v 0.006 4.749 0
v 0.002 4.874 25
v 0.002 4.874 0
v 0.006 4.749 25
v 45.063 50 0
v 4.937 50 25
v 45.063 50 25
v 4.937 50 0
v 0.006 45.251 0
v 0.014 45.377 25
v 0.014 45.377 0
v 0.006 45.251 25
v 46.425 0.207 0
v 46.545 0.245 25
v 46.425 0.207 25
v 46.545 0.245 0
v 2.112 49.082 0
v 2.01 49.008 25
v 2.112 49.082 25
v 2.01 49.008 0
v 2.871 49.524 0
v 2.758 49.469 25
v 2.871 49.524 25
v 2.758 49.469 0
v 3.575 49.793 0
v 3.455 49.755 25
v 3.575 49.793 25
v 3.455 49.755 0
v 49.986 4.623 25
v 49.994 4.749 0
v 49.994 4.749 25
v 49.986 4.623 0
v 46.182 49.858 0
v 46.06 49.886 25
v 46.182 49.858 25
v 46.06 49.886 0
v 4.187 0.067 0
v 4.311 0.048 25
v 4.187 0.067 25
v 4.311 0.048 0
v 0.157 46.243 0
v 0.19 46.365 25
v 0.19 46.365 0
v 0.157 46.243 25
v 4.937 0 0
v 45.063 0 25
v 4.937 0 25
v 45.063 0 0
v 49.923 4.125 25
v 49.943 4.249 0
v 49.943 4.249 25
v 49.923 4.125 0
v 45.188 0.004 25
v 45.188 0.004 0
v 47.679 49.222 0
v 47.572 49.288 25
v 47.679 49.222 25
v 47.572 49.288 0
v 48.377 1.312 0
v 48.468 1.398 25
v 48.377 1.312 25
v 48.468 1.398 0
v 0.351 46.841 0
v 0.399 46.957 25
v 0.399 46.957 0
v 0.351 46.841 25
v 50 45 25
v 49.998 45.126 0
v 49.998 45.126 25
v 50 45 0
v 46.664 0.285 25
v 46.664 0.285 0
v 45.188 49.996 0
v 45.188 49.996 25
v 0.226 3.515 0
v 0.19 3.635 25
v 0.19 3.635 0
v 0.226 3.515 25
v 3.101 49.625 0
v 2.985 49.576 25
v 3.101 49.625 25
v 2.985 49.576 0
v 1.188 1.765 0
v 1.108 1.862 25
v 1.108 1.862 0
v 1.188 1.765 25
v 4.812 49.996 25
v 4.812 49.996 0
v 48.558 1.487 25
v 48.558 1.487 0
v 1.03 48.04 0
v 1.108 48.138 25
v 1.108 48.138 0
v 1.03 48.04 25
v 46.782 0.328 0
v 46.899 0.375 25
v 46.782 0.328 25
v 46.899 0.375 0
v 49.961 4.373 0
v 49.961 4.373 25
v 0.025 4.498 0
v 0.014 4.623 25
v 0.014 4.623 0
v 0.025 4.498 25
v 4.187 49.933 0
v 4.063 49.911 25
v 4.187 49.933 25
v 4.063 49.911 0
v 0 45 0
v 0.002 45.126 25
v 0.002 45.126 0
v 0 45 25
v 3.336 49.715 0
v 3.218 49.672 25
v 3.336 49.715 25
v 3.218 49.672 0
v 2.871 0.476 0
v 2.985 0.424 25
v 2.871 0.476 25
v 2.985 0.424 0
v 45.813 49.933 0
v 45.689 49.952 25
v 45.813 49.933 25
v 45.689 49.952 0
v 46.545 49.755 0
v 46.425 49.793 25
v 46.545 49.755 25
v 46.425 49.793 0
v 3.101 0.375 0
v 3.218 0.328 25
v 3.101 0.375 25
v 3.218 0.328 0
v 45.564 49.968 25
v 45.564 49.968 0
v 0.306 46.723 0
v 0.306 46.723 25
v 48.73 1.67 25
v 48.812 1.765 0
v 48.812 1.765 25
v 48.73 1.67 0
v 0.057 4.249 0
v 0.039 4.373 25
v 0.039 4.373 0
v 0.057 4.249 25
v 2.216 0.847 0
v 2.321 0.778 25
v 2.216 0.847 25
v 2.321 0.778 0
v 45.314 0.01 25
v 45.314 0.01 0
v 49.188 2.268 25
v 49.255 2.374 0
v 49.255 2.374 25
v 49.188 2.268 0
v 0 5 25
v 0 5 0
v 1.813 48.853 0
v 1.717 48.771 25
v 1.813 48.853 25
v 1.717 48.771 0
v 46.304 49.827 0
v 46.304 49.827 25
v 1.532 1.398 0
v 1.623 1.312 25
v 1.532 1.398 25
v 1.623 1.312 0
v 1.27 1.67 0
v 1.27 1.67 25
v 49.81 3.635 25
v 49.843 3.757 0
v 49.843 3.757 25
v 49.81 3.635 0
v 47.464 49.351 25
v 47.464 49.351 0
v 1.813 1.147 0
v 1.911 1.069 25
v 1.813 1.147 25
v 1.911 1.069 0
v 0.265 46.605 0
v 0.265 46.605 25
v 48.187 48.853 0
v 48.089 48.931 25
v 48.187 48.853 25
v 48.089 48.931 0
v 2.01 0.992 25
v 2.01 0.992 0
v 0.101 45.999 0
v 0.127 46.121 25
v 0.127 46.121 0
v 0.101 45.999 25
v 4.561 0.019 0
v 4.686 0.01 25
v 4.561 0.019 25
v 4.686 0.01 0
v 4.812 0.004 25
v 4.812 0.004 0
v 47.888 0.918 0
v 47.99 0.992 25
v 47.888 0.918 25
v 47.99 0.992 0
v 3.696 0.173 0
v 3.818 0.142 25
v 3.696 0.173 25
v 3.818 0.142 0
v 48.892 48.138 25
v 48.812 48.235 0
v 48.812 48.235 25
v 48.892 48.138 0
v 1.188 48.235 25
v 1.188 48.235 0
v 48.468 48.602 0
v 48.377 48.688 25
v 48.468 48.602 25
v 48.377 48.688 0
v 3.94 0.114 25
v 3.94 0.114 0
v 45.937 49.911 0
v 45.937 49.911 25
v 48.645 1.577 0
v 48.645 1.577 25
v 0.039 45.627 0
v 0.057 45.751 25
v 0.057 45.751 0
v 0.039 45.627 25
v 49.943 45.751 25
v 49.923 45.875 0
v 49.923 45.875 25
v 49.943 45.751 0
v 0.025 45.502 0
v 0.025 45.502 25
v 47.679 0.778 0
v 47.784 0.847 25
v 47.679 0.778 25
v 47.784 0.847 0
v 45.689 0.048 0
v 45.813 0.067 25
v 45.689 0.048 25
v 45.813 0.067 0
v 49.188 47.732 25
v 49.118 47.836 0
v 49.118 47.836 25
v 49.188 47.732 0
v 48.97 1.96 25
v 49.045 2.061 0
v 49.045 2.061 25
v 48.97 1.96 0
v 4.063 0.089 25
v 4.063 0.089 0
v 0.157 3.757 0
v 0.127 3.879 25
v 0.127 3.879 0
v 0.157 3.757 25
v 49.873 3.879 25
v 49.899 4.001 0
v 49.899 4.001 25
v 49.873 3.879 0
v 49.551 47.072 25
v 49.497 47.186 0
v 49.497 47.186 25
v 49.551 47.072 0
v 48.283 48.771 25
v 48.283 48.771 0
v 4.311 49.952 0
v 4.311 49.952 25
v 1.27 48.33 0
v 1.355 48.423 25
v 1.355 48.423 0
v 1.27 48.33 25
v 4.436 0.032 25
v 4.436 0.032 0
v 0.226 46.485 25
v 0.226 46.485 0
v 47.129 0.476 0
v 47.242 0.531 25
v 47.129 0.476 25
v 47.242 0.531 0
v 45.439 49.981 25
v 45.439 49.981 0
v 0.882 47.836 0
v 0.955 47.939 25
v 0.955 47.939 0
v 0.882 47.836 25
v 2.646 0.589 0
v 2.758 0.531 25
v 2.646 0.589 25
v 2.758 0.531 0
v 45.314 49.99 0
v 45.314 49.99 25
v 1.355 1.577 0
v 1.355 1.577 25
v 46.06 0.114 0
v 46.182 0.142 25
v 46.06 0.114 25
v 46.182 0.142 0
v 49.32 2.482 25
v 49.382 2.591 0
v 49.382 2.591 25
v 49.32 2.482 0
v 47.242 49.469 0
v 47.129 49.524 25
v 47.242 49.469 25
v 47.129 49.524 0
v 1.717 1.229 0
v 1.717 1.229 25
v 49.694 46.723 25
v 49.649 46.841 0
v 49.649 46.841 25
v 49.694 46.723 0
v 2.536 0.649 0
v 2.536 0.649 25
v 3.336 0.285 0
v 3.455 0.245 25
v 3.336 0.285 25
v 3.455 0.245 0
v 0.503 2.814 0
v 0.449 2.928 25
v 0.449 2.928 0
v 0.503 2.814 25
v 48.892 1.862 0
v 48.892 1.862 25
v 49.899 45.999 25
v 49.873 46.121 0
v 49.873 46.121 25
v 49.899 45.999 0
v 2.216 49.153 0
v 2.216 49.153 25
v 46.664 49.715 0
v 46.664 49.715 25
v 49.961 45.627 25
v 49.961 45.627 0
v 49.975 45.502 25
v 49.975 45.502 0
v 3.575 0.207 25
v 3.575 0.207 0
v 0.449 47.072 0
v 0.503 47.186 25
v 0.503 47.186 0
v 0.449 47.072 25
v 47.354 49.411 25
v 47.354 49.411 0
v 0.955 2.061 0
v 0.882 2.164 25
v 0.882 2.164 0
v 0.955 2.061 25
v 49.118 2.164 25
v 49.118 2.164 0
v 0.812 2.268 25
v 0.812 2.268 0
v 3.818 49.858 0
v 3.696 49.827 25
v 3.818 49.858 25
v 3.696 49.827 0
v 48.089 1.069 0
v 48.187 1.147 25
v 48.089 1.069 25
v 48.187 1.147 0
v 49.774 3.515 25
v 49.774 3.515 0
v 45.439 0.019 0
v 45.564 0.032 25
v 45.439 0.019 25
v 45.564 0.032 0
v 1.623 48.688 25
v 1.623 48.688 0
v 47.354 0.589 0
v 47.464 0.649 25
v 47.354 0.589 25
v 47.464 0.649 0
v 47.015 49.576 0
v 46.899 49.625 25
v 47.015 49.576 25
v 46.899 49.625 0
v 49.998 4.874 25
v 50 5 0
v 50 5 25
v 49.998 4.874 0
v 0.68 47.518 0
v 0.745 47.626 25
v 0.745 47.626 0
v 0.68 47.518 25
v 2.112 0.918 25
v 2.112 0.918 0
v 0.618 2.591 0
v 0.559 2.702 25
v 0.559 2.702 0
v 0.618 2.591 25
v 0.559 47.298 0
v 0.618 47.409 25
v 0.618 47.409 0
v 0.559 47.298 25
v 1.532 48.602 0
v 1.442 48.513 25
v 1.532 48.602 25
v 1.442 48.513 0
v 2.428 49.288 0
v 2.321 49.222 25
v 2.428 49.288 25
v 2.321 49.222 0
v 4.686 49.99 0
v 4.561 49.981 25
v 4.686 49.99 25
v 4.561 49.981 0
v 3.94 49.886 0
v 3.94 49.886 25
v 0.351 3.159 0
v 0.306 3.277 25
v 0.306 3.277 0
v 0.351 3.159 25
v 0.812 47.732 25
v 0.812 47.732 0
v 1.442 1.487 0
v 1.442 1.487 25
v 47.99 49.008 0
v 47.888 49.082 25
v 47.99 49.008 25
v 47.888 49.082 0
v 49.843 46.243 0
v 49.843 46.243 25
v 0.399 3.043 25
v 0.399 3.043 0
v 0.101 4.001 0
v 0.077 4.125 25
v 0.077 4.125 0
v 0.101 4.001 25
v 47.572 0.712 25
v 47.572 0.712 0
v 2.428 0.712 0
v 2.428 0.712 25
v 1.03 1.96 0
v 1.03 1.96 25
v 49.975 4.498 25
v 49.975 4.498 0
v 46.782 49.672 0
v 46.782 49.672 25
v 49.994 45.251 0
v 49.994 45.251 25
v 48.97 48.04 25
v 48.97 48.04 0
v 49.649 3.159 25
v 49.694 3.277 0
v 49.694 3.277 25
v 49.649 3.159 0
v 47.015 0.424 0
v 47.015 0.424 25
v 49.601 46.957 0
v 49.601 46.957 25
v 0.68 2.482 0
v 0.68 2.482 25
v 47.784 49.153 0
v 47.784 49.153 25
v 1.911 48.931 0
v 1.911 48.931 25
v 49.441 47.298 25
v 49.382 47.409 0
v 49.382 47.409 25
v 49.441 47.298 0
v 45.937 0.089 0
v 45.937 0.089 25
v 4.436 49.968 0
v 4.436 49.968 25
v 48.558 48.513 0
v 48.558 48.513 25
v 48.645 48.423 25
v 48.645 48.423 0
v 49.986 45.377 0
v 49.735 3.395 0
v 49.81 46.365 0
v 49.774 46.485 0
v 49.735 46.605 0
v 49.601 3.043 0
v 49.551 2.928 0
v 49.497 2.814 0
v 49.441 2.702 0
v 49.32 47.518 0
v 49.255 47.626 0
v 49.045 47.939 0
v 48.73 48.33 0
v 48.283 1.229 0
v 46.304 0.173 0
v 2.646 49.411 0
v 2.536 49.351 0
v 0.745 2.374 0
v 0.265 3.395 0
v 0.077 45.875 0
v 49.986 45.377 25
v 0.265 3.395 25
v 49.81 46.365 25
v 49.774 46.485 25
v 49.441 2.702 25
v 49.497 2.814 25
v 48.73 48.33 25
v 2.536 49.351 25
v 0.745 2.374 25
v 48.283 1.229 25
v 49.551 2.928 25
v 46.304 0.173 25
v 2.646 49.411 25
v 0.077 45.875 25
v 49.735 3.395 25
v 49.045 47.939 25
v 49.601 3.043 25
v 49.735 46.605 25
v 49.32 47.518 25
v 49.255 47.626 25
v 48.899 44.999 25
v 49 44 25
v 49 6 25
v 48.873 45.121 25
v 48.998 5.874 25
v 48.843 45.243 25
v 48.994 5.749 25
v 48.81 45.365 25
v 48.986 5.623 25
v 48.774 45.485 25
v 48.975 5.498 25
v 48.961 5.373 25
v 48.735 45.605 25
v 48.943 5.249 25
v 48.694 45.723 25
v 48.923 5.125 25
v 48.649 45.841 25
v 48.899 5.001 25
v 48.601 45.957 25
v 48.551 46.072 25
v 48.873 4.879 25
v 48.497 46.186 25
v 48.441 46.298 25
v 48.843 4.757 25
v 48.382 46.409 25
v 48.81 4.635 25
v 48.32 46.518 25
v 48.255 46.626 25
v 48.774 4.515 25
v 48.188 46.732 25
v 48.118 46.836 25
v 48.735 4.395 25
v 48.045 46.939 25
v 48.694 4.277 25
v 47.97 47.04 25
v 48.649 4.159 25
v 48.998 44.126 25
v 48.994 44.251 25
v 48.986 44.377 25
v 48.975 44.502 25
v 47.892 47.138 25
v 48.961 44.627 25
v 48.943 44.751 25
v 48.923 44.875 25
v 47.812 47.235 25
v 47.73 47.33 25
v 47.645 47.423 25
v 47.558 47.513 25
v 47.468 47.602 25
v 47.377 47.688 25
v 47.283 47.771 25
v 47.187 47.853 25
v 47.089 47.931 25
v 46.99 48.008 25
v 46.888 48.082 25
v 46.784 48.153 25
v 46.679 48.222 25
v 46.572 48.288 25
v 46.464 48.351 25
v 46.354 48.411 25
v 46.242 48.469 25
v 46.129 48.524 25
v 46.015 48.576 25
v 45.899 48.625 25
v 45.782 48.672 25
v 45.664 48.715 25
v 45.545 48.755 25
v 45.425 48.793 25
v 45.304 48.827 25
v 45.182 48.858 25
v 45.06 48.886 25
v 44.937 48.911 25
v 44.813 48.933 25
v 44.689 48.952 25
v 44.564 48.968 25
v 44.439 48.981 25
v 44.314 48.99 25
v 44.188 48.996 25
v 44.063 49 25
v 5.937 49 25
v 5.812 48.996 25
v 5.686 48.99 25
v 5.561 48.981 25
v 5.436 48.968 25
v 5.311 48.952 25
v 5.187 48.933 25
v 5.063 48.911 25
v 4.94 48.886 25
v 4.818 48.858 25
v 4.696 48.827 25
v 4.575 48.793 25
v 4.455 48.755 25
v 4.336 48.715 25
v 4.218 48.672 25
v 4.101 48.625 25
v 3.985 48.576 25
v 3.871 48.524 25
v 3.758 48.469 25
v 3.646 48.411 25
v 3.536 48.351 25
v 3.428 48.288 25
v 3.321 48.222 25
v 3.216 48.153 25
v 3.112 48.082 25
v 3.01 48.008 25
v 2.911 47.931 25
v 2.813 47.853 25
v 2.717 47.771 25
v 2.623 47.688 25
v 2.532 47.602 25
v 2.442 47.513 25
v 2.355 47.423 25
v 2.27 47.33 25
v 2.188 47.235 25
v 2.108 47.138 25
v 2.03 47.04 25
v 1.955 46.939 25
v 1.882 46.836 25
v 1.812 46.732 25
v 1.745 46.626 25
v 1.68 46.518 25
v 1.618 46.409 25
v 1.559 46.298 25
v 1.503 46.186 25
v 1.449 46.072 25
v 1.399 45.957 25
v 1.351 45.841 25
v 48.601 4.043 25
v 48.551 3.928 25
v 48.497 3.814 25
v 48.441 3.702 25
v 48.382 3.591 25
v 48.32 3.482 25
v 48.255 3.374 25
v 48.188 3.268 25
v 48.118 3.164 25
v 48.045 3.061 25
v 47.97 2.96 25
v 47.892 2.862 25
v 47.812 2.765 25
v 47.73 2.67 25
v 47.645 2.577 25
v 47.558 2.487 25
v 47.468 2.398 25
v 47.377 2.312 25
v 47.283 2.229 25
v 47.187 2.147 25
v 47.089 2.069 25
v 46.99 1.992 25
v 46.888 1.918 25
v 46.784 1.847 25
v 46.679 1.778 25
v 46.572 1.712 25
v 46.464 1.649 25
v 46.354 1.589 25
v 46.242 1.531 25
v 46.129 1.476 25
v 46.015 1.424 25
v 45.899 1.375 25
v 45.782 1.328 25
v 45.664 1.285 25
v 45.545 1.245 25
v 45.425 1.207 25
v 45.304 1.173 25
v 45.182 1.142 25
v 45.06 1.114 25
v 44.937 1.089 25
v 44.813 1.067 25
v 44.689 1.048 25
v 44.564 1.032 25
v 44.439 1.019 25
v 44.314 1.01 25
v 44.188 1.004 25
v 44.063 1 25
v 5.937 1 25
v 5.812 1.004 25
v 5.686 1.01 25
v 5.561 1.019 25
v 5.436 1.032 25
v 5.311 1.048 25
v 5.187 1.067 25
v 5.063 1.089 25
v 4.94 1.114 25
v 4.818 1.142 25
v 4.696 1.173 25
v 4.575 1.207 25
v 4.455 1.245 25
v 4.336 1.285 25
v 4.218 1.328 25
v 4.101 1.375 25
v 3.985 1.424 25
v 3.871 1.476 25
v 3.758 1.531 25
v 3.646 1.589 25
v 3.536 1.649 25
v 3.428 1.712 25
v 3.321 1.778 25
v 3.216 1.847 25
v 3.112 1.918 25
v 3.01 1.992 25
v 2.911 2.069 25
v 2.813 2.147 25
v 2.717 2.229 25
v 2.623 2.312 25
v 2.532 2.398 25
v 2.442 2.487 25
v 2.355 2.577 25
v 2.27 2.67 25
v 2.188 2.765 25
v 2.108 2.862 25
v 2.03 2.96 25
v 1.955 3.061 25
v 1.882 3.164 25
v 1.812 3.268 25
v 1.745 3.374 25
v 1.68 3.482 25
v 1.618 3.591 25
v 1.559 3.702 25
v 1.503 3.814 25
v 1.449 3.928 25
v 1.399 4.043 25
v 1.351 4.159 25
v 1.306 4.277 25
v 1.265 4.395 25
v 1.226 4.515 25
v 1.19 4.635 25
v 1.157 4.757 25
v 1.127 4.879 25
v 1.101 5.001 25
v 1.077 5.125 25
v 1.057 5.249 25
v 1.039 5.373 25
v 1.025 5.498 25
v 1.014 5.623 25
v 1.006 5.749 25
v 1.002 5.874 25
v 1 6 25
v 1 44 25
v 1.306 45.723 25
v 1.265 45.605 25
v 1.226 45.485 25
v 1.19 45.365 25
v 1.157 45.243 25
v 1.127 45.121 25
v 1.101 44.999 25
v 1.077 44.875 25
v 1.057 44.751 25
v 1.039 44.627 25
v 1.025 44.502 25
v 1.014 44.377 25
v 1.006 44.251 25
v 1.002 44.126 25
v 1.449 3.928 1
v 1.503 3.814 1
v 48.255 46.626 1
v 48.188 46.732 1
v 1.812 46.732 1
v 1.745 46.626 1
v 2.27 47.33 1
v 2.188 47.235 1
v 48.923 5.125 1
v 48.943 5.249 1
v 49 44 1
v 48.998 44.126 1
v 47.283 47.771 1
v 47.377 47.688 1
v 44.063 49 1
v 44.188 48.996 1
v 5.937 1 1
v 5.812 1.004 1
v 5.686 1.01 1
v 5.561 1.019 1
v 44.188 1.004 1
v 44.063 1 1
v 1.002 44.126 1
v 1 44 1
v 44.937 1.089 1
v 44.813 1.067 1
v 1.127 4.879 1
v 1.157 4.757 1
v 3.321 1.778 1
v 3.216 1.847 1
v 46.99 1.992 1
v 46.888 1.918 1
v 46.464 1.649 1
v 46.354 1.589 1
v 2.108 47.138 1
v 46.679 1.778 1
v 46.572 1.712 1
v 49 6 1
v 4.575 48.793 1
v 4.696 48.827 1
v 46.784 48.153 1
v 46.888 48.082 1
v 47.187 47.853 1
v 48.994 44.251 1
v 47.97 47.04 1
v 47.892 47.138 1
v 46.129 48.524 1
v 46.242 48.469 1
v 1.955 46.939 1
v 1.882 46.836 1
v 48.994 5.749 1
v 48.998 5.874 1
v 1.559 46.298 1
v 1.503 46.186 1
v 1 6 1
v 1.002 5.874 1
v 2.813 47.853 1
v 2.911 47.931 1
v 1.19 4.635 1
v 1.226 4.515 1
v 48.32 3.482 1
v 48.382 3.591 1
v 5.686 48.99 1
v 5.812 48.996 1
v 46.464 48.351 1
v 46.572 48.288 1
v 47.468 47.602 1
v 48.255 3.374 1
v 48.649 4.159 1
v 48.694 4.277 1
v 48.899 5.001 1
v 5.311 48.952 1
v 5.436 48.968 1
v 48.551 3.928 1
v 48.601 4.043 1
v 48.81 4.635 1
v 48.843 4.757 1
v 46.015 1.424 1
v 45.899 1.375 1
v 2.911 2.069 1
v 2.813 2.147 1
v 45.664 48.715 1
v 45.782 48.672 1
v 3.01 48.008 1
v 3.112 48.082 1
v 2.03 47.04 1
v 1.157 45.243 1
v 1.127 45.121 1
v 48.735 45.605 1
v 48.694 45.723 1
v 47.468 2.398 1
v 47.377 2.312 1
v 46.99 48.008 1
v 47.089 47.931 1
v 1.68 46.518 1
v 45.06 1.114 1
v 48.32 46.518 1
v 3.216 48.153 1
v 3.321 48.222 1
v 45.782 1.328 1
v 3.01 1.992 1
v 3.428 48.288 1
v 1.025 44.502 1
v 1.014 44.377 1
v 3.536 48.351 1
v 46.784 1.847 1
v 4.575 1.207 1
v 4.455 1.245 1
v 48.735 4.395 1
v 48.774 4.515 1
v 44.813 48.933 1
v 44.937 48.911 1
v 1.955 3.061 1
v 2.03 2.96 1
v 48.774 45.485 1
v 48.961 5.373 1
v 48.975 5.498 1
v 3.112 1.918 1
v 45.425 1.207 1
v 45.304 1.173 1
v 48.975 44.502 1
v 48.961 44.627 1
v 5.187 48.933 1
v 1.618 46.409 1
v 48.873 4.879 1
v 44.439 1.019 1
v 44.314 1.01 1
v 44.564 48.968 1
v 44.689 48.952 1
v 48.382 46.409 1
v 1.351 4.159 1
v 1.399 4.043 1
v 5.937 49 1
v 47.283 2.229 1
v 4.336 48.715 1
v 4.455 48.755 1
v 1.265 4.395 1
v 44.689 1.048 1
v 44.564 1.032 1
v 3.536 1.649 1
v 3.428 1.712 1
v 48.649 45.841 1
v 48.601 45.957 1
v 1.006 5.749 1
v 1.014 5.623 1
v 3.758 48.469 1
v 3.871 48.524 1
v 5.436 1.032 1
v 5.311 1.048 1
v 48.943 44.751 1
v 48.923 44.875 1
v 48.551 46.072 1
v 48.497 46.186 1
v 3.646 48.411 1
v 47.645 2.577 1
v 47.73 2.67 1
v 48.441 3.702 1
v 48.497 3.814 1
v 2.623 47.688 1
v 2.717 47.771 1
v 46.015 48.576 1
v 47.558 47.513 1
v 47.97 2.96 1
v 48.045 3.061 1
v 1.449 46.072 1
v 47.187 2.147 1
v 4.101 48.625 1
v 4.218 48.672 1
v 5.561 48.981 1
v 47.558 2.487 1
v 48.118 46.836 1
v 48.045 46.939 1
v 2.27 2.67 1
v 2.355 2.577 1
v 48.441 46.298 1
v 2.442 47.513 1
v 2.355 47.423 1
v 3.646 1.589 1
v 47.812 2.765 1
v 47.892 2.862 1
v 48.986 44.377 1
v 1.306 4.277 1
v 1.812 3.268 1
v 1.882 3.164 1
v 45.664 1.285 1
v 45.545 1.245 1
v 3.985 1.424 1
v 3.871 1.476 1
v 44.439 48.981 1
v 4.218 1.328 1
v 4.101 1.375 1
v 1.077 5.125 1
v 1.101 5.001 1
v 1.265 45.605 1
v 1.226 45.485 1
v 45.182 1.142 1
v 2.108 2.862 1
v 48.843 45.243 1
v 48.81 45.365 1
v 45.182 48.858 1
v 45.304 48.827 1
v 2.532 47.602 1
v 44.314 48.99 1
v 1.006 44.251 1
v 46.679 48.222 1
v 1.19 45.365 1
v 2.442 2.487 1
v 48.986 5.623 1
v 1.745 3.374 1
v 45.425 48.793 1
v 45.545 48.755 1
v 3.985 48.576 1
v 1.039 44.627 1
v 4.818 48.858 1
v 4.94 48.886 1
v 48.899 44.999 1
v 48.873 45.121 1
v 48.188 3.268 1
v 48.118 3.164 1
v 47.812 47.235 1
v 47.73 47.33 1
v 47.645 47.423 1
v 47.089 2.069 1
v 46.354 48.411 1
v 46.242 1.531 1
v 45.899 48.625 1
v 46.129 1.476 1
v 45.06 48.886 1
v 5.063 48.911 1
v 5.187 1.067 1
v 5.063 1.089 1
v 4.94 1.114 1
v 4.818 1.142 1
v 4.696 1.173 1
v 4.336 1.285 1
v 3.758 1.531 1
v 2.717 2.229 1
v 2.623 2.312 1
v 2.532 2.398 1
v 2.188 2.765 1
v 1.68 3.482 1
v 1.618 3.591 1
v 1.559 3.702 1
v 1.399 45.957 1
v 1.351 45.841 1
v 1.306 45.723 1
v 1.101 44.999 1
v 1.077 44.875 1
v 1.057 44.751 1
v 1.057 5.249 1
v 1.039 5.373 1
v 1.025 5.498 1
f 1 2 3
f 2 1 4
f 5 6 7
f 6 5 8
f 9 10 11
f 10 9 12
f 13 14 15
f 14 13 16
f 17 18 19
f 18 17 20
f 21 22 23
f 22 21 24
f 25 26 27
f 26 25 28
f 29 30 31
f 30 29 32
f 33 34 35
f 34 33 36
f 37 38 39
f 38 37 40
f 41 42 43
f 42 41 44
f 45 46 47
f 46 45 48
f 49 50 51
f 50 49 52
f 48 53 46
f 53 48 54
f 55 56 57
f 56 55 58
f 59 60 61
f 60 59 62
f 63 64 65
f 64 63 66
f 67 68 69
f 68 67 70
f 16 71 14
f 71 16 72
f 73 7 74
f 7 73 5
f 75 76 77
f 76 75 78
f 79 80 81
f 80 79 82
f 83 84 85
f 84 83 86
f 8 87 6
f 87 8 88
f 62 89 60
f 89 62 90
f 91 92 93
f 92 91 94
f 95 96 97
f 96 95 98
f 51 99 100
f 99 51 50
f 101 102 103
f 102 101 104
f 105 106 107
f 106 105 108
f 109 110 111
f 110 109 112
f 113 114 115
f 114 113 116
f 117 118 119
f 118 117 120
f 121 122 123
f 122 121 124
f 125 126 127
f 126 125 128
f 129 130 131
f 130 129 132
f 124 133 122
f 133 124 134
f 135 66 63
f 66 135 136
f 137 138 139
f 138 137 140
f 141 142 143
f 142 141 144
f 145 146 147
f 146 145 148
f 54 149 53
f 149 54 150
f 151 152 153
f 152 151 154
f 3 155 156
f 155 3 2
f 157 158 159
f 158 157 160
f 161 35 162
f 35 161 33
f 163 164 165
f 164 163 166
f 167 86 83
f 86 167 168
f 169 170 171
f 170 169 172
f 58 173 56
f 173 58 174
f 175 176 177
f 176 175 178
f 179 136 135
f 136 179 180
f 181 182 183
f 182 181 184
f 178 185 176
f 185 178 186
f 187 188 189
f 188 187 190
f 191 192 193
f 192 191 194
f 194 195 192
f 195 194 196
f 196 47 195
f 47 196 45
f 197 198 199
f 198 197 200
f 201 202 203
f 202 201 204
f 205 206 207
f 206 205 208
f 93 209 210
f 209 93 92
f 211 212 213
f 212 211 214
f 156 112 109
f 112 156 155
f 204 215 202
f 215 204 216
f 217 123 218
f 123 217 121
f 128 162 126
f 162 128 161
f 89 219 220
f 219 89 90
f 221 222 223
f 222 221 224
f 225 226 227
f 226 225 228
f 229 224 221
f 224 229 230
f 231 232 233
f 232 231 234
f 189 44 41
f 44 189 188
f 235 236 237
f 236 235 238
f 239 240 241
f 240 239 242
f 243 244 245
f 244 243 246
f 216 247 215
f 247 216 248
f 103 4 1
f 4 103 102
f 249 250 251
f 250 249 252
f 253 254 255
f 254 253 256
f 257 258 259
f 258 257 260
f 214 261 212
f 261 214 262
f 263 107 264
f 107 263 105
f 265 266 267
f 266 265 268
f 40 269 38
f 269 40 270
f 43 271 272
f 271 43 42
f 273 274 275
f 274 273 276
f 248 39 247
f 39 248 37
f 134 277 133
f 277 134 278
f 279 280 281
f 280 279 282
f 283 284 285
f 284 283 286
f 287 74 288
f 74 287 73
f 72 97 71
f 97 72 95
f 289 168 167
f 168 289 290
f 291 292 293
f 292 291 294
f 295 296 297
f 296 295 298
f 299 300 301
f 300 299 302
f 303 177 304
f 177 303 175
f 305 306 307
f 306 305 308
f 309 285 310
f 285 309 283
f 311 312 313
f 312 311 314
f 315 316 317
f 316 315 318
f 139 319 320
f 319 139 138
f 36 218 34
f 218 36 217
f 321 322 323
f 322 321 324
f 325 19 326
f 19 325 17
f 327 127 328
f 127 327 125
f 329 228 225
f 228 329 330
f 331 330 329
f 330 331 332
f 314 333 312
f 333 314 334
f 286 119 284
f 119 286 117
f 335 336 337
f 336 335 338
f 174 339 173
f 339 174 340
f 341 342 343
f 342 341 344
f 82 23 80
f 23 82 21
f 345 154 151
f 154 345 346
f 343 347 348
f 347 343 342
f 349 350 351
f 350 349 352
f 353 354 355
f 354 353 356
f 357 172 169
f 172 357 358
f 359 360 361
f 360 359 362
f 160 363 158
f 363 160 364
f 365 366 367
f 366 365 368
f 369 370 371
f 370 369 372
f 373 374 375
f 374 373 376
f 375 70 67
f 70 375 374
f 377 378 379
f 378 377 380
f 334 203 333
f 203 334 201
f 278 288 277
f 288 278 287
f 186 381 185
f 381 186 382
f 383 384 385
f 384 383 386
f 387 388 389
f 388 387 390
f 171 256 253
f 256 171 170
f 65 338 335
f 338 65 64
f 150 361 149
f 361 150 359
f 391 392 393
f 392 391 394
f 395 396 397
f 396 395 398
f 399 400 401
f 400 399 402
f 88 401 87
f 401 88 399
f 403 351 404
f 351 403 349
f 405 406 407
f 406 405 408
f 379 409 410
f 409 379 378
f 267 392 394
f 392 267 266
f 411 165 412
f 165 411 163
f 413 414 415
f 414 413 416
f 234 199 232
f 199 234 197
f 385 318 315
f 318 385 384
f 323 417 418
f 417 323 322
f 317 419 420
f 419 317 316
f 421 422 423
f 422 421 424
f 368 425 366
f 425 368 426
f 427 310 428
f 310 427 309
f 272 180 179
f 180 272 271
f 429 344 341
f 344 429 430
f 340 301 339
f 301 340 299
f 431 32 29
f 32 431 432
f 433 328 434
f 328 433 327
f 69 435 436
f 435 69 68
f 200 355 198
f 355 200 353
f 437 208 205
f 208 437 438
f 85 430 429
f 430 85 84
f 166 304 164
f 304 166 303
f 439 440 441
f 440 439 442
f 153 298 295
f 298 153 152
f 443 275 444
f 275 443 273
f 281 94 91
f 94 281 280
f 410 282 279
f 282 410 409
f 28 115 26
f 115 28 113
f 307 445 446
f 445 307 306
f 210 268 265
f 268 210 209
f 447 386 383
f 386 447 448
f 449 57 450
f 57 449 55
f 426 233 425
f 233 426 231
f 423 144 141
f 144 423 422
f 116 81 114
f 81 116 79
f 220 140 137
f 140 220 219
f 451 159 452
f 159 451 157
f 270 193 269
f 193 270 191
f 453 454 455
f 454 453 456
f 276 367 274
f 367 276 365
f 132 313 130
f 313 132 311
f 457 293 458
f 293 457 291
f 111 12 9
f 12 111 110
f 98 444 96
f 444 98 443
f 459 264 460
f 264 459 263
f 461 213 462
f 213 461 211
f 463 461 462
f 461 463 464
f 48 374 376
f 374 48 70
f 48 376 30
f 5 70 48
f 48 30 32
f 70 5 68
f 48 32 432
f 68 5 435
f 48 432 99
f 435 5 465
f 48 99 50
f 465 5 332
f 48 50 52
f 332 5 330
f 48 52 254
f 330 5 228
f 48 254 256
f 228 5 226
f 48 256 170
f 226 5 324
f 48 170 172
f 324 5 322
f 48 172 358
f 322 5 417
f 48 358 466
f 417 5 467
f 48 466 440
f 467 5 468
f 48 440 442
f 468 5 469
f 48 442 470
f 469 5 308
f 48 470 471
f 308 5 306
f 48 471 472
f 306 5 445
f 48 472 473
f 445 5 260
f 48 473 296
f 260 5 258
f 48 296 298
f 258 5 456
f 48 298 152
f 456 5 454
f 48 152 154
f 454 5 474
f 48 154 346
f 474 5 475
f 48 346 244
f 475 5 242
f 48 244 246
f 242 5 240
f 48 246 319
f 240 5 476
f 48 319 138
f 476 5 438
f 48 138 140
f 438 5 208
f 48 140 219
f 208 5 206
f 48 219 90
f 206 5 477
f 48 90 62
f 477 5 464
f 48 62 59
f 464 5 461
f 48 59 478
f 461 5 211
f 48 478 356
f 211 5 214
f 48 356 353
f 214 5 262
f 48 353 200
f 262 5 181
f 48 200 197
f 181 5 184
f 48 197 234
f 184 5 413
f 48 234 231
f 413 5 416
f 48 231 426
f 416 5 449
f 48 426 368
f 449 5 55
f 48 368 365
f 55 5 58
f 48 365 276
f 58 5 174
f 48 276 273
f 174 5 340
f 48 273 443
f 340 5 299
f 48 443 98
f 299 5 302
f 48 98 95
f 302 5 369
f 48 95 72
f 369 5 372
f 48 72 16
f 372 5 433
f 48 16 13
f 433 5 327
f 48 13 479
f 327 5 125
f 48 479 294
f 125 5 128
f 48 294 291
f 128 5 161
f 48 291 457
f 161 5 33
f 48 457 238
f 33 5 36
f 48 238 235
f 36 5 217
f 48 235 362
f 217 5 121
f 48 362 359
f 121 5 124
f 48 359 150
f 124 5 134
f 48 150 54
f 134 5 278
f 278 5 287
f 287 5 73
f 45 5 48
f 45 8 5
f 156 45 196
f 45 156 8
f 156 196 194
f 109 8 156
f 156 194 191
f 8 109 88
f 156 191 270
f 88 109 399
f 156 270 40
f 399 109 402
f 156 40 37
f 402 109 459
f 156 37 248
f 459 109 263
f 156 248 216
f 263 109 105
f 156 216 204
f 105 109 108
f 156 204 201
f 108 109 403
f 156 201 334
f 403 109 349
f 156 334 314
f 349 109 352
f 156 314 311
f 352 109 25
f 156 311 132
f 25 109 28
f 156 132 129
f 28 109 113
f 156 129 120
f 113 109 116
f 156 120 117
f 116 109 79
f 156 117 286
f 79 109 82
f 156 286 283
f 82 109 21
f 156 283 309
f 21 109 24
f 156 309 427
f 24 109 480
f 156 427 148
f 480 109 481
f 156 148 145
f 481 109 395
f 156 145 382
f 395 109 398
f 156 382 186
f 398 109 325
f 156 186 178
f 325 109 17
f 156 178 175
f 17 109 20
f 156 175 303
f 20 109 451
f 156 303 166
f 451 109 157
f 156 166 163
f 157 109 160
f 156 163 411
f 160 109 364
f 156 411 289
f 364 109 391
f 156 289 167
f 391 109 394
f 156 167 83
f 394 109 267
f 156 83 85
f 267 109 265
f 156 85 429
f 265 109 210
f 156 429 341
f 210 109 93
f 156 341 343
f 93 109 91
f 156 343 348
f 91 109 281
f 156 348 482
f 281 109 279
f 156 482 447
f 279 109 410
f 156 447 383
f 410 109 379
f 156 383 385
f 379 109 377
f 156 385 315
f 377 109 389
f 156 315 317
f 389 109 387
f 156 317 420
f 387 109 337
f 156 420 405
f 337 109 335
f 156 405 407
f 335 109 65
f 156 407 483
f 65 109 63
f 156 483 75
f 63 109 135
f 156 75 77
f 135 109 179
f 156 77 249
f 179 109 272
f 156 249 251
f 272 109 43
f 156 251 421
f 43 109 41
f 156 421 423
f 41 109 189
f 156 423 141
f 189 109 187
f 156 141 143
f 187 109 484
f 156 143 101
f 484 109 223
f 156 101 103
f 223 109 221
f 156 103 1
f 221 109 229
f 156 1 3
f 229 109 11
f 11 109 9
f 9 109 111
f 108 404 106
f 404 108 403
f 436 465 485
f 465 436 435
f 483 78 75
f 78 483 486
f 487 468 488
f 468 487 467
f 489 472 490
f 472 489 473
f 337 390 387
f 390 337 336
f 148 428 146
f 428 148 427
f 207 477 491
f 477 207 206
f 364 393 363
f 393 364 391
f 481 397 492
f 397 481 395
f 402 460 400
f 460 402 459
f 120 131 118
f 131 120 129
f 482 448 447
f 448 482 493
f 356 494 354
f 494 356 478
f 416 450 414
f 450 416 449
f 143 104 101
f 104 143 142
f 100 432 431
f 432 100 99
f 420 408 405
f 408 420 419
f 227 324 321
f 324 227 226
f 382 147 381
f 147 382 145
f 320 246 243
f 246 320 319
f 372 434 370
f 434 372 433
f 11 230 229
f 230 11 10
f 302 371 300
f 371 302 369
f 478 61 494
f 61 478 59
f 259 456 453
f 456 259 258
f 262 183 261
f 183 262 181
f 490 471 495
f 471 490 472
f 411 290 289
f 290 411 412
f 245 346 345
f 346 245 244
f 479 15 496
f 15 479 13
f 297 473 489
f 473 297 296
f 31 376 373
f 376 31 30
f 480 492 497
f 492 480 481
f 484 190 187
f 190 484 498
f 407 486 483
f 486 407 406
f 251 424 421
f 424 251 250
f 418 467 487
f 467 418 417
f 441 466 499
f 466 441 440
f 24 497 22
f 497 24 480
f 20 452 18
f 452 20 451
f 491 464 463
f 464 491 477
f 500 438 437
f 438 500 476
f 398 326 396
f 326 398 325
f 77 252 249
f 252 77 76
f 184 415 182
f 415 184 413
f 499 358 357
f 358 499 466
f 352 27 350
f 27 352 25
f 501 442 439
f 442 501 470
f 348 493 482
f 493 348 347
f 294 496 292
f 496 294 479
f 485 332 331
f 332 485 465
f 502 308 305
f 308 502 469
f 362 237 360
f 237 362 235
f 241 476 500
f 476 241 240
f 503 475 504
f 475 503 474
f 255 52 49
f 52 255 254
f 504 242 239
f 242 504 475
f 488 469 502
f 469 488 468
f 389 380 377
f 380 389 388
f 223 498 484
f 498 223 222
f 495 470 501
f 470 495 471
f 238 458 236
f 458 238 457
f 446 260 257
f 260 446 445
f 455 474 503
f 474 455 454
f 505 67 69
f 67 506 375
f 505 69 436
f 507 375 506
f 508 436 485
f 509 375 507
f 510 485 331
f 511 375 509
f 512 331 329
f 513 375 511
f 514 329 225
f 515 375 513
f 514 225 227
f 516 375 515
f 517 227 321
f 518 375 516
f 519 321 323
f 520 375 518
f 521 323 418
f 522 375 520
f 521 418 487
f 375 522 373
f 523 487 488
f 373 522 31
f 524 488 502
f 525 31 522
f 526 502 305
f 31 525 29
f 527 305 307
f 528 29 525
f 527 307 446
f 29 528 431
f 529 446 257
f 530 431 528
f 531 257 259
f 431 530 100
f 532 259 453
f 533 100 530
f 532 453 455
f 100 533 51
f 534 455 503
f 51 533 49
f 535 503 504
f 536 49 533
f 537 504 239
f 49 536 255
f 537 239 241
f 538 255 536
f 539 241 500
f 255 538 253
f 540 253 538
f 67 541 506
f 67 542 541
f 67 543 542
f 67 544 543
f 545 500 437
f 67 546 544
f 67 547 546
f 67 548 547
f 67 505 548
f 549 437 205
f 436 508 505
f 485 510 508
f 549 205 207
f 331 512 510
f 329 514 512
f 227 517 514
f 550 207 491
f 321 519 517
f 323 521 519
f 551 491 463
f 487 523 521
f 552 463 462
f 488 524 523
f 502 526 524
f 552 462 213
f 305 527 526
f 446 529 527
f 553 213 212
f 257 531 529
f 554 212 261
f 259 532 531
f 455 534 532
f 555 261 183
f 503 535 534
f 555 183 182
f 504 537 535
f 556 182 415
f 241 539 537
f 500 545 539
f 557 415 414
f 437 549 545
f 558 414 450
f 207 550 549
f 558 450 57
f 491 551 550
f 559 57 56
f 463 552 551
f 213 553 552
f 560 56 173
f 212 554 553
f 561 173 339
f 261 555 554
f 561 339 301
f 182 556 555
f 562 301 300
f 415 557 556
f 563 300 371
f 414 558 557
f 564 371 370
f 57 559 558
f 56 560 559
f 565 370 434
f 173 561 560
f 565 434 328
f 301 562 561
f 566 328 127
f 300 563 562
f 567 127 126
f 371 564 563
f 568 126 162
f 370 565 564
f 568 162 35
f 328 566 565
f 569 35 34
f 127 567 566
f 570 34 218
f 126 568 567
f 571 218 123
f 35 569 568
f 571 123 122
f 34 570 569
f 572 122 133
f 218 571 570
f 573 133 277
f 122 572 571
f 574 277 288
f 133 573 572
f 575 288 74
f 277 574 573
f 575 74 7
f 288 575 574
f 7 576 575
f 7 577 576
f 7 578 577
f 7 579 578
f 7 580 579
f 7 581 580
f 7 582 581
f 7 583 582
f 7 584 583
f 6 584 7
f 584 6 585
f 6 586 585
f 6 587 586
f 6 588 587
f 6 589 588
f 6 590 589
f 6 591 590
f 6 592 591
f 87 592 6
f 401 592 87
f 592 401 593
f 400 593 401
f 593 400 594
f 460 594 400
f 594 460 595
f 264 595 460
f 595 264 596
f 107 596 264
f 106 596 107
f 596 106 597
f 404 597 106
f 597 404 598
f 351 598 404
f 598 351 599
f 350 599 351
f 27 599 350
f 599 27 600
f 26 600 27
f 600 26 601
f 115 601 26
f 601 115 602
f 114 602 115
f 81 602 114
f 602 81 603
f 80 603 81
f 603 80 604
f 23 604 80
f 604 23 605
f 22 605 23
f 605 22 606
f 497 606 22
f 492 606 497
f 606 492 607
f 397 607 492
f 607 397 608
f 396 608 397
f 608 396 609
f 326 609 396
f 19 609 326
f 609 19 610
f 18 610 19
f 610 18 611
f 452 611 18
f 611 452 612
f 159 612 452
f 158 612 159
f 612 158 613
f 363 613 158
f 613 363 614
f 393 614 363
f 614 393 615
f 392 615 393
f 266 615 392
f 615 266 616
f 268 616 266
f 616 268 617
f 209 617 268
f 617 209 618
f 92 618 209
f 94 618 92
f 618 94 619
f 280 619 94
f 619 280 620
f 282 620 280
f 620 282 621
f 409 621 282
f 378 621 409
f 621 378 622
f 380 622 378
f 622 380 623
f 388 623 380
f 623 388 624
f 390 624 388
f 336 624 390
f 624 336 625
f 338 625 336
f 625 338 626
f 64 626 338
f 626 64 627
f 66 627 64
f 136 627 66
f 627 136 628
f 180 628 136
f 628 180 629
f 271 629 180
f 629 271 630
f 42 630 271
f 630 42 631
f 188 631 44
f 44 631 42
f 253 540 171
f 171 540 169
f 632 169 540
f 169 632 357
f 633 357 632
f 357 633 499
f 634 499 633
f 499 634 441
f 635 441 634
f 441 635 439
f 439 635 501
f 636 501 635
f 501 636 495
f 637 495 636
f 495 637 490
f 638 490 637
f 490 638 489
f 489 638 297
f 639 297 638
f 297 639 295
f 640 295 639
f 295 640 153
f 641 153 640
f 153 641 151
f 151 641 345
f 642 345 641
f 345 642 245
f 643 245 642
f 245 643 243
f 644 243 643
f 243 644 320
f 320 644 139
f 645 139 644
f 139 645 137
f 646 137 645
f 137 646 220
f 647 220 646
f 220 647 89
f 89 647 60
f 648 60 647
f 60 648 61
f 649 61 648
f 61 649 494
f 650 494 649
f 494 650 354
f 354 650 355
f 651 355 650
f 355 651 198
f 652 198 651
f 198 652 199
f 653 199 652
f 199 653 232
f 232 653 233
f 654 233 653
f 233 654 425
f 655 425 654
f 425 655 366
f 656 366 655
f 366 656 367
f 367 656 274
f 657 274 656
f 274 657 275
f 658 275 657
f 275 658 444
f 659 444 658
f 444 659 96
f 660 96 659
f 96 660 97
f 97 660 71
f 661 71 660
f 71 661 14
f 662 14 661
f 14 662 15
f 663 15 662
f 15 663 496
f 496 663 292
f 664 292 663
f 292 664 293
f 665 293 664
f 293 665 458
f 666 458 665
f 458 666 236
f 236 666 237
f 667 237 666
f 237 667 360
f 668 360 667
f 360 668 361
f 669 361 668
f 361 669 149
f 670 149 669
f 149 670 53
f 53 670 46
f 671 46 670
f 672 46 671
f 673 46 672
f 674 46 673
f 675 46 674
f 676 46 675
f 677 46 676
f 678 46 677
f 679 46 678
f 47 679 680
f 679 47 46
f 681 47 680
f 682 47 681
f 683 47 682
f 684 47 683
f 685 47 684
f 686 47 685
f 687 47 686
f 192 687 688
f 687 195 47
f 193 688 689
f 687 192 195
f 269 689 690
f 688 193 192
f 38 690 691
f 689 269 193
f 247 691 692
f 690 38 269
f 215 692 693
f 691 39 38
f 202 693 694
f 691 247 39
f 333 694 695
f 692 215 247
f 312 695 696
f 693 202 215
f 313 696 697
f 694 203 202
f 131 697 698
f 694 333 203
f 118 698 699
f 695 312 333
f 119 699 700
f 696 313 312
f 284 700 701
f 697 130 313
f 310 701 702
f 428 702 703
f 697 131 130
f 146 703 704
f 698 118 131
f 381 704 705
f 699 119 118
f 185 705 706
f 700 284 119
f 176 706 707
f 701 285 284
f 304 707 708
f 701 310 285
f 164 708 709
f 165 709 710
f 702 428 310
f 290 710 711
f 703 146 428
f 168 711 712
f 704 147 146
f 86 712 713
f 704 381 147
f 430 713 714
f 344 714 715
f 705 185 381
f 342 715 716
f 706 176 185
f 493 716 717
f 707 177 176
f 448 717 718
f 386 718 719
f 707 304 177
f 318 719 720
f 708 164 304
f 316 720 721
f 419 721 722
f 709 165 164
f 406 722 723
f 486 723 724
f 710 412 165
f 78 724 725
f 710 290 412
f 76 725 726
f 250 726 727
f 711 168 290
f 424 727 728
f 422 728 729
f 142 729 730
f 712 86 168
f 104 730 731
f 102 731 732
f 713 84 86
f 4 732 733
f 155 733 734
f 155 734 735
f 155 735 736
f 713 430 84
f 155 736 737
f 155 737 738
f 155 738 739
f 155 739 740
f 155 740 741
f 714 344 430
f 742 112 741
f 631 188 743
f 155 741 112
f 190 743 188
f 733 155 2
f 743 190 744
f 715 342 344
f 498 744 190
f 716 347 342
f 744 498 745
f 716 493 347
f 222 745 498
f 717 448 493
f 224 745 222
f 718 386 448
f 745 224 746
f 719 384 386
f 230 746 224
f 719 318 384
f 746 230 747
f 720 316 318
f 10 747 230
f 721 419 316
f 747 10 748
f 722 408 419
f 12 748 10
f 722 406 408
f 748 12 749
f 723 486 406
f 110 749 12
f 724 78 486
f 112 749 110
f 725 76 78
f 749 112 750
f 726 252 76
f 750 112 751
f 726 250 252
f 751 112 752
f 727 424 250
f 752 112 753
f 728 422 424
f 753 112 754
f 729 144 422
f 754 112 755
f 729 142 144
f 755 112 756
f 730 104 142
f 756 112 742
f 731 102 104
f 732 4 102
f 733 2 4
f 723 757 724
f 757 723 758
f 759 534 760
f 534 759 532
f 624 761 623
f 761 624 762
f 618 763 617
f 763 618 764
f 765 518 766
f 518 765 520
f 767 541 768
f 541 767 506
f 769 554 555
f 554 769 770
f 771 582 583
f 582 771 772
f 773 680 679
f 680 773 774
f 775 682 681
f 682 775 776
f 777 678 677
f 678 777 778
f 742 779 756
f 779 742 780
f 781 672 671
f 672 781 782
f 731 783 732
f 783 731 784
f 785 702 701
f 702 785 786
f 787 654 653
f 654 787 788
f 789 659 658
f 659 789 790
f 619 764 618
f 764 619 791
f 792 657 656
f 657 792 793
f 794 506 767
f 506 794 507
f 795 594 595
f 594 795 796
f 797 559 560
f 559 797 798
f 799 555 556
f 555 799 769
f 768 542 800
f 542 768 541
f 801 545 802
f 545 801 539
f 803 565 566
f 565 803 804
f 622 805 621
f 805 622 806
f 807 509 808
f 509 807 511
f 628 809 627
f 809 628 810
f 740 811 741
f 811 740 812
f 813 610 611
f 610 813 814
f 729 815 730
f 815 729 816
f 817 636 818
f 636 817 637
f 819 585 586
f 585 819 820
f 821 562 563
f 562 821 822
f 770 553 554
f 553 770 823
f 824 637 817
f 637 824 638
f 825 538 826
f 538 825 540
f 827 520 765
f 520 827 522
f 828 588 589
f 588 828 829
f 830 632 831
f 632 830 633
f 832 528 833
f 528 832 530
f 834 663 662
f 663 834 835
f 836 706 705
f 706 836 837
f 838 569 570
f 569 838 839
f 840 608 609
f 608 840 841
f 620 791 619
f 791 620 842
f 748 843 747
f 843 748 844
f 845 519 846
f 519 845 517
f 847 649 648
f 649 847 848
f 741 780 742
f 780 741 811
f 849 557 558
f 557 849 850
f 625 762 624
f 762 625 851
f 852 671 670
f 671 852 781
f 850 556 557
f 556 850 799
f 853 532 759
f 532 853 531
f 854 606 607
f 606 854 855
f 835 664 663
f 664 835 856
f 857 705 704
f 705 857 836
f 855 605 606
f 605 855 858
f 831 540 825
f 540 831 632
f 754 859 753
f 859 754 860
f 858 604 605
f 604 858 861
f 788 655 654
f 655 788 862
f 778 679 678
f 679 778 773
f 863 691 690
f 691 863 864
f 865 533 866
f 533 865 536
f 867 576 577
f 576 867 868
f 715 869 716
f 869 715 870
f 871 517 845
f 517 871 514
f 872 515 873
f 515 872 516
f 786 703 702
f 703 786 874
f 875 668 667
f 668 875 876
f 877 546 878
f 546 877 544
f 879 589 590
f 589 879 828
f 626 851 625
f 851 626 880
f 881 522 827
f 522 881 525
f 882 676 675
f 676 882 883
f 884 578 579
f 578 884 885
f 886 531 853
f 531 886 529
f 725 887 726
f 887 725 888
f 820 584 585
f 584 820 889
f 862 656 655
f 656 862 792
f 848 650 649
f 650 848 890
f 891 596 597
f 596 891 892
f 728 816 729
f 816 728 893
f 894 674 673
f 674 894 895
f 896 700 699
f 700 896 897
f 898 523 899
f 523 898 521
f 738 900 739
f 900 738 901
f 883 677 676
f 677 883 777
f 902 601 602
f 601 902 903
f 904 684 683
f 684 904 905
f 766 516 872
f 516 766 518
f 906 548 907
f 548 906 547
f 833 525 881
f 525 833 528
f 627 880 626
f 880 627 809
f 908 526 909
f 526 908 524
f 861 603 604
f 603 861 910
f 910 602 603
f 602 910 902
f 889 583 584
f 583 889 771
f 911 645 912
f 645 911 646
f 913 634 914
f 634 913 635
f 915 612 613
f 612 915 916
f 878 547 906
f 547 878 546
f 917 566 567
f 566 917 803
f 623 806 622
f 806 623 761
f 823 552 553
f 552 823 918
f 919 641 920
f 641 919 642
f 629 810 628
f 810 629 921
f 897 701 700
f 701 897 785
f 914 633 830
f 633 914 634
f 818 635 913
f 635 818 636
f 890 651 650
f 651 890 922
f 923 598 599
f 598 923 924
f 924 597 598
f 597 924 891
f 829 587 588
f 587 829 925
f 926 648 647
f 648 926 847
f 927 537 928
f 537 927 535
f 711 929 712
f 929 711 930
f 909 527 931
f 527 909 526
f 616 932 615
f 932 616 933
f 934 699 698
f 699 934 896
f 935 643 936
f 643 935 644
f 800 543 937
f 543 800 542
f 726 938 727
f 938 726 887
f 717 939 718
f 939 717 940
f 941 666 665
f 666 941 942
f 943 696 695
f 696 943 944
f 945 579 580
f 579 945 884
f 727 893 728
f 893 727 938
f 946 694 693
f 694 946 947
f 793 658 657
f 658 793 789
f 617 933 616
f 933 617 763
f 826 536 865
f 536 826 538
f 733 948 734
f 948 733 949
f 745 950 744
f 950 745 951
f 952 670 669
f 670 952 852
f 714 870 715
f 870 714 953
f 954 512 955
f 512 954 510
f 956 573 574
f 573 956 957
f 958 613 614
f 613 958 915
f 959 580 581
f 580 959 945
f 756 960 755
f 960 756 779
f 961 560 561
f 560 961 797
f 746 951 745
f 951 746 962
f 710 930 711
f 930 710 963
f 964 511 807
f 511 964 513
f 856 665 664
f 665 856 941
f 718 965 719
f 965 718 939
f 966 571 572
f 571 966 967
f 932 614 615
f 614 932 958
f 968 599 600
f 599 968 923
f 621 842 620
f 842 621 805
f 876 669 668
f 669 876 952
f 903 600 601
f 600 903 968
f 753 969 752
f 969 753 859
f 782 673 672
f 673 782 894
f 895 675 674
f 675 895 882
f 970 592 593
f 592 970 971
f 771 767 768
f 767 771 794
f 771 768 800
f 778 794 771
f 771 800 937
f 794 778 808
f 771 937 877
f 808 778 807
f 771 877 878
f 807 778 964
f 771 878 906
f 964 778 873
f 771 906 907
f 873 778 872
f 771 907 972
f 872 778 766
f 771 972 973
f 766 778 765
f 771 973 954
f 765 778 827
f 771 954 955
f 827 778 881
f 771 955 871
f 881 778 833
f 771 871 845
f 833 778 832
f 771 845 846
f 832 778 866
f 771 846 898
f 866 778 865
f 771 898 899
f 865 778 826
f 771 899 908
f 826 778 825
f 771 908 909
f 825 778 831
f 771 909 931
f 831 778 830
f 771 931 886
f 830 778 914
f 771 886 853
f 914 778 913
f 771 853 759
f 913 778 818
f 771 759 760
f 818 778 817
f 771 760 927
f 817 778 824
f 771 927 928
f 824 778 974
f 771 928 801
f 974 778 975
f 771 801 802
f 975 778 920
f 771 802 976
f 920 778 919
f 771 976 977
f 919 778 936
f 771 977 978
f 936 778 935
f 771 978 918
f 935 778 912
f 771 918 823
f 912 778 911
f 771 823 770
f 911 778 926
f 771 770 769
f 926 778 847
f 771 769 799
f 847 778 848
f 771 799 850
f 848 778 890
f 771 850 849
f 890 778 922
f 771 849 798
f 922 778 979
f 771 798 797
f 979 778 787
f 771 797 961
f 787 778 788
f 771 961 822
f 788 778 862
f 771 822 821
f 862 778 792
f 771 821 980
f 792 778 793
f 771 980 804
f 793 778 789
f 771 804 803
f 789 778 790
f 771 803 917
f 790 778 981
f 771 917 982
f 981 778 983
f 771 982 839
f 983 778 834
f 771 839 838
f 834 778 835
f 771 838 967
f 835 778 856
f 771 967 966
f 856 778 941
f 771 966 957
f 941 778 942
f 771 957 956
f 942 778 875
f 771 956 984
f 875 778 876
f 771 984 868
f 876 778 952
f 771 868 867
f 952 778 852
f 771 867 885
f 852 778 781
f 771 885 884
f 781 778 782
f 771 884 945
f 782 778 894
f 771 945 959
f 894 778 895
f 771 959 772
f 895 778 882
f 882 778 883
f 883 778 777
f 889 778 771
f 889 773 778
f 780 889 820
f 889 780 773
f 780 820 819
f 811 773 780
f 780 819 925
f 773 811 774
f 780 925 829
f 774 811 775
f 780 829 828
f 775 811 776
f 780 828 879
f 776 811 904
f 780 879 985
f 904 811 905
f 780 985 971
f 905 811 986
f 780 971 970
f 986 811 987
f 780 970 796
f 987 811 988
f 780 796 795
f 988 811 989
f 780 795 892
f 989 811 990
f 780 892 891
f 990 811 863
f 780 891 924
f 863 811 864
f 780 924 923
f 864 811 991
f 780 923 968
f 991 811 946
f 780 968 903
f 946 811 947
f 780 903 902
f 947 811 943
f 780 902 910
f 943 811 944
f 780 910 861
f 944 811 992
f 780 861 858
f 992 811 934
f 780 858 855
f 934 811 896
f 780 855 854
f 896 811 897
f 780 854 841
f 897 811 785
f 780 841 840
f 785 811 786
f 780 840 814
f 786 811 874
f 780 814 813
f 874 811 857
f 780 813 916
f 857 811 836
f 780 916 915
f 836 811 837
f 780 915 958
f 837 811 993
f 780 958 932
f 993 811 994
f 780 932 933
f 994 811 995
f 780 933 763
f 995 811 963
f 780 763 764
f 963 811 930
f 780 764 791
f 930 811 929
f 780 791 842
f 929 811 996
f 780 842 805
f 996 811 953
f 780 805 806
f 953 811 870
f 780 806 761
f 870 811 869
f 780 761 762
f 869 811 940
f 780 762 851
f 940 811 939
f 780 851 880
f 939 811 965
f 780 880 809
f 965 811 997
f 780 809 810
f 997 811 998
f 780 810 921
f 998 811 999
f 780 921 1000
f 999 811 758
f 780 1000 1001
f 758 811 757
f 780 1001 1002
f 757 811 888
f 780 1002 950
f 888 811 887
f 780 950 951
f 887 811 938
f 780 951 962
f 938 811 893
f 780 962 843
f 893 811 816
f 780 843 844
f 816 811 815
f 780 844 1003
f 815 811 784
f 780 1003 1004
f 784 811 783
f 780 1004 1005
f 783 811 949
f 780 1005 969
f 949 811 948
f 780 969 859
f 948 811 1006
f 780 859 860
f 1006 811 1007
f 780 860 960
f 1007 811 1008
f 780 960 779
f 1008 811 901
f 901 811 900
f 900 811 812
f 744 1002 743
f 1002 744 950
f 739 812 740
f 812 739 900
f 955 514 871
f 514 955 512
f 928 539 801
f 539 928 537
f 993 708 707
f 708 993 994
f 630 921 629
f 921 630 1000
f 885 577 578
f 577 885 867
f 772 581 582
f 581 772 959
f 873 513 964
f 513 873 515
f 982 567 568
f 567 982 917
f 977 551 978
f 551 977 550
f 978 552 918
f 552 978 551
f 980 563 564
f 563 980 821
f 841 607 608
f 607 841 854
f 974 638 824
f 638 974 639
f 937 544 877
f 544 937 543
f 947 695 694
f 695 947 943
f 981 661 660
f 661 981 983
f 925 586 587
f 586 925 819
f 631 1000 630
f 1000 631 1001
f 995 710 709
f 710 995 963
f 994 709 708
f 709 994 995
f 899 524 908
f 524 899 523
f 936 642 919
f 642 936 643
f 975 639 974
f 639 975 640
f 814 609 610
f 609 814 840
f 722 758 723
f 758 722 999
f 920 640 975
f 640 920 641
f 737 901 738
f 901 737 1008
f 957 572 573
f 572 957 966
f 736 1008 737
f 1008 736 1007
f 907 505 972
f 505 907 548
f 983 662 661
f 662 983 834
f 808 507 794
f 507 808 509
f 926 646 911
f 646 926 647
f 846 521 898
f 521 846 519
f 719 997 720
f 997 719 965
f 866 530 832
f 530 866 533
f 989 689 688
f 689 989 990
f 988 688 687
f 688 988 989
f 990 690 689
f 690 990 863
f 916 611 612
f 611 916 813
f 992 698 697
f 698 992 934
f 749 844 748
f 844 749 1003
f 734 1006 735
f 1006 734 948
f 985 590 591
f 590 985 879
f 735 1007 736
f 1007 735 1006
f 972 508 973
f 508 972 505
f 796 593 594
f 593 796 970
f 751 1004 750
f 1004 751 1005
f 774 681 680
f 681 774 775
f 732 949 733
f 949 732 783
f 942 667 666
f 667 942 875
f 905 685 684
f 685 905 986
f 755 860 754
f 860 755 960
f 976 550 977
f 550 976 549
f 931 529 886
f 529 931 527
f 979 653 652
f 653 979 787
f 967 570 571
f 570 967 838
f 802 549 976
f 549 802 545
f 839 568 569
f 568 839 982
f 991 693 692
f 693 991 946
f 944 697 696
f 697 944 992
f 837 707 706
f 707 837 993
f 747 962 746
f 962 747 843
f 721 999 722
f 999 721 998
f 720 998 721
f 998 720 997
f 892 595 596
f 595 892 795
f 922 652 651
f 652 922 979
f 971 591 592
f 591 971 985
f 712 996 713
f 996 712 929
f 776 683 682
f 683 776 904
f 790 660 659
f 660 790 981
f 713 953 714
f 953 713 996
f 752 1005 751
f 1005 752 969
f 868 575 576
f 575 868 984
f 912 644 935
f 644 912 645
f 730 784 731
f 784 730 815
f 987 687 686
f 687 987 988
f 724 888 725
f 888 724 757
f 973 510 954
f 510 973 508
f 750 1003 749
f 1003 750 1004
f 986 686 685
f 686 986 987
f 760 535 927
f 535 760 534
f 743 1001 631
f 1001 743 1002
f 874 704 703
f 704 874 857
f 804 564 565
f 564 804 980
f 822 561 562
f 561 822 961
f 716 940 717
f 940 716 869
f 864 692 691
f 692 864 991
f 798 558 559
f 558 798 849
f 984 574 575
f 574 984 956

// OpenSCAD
//basic af box
// preview[view:south, tilt:top]

//CUSTOMIZER VARIABLES
$fn = $fn + 250;

//Length
x = 50; // [1:150]
//Width
y = 50; // [1:150]
//Height
z = 25; // [1:150]

wall_thickness = 1; // [1:150]
base_thickness = 1; // [1:150]
chamfer_edge = 5; // [1:150]

//CUSTOMIZER VARIABLES END

difference(){
    roundedcube(x,y,z,chamfer_edge);
    translate([wall_thickness,wall_thickness,base_thickness])
    roundedcube(x-(wall_thickness*2),y-(wall_thickness*2),z,chamfer_edge);
}

module roundedcube(xdim ,ydim ,zdim,rdim){
hull(){
    translate([rdim,rdim,0])cylinder(h=zdim,r=rdim);
    translate([xdim-rdim,rdim,0])cylinder(h=zdim,r=rdim);
    translate([rdim,ydim-rdim,0])cylinder(h=zdim,r=rdim);
    translate([xdim-rdim,ydim-rdim,0])cylinder(h=zdim,r=rdim);
}}
